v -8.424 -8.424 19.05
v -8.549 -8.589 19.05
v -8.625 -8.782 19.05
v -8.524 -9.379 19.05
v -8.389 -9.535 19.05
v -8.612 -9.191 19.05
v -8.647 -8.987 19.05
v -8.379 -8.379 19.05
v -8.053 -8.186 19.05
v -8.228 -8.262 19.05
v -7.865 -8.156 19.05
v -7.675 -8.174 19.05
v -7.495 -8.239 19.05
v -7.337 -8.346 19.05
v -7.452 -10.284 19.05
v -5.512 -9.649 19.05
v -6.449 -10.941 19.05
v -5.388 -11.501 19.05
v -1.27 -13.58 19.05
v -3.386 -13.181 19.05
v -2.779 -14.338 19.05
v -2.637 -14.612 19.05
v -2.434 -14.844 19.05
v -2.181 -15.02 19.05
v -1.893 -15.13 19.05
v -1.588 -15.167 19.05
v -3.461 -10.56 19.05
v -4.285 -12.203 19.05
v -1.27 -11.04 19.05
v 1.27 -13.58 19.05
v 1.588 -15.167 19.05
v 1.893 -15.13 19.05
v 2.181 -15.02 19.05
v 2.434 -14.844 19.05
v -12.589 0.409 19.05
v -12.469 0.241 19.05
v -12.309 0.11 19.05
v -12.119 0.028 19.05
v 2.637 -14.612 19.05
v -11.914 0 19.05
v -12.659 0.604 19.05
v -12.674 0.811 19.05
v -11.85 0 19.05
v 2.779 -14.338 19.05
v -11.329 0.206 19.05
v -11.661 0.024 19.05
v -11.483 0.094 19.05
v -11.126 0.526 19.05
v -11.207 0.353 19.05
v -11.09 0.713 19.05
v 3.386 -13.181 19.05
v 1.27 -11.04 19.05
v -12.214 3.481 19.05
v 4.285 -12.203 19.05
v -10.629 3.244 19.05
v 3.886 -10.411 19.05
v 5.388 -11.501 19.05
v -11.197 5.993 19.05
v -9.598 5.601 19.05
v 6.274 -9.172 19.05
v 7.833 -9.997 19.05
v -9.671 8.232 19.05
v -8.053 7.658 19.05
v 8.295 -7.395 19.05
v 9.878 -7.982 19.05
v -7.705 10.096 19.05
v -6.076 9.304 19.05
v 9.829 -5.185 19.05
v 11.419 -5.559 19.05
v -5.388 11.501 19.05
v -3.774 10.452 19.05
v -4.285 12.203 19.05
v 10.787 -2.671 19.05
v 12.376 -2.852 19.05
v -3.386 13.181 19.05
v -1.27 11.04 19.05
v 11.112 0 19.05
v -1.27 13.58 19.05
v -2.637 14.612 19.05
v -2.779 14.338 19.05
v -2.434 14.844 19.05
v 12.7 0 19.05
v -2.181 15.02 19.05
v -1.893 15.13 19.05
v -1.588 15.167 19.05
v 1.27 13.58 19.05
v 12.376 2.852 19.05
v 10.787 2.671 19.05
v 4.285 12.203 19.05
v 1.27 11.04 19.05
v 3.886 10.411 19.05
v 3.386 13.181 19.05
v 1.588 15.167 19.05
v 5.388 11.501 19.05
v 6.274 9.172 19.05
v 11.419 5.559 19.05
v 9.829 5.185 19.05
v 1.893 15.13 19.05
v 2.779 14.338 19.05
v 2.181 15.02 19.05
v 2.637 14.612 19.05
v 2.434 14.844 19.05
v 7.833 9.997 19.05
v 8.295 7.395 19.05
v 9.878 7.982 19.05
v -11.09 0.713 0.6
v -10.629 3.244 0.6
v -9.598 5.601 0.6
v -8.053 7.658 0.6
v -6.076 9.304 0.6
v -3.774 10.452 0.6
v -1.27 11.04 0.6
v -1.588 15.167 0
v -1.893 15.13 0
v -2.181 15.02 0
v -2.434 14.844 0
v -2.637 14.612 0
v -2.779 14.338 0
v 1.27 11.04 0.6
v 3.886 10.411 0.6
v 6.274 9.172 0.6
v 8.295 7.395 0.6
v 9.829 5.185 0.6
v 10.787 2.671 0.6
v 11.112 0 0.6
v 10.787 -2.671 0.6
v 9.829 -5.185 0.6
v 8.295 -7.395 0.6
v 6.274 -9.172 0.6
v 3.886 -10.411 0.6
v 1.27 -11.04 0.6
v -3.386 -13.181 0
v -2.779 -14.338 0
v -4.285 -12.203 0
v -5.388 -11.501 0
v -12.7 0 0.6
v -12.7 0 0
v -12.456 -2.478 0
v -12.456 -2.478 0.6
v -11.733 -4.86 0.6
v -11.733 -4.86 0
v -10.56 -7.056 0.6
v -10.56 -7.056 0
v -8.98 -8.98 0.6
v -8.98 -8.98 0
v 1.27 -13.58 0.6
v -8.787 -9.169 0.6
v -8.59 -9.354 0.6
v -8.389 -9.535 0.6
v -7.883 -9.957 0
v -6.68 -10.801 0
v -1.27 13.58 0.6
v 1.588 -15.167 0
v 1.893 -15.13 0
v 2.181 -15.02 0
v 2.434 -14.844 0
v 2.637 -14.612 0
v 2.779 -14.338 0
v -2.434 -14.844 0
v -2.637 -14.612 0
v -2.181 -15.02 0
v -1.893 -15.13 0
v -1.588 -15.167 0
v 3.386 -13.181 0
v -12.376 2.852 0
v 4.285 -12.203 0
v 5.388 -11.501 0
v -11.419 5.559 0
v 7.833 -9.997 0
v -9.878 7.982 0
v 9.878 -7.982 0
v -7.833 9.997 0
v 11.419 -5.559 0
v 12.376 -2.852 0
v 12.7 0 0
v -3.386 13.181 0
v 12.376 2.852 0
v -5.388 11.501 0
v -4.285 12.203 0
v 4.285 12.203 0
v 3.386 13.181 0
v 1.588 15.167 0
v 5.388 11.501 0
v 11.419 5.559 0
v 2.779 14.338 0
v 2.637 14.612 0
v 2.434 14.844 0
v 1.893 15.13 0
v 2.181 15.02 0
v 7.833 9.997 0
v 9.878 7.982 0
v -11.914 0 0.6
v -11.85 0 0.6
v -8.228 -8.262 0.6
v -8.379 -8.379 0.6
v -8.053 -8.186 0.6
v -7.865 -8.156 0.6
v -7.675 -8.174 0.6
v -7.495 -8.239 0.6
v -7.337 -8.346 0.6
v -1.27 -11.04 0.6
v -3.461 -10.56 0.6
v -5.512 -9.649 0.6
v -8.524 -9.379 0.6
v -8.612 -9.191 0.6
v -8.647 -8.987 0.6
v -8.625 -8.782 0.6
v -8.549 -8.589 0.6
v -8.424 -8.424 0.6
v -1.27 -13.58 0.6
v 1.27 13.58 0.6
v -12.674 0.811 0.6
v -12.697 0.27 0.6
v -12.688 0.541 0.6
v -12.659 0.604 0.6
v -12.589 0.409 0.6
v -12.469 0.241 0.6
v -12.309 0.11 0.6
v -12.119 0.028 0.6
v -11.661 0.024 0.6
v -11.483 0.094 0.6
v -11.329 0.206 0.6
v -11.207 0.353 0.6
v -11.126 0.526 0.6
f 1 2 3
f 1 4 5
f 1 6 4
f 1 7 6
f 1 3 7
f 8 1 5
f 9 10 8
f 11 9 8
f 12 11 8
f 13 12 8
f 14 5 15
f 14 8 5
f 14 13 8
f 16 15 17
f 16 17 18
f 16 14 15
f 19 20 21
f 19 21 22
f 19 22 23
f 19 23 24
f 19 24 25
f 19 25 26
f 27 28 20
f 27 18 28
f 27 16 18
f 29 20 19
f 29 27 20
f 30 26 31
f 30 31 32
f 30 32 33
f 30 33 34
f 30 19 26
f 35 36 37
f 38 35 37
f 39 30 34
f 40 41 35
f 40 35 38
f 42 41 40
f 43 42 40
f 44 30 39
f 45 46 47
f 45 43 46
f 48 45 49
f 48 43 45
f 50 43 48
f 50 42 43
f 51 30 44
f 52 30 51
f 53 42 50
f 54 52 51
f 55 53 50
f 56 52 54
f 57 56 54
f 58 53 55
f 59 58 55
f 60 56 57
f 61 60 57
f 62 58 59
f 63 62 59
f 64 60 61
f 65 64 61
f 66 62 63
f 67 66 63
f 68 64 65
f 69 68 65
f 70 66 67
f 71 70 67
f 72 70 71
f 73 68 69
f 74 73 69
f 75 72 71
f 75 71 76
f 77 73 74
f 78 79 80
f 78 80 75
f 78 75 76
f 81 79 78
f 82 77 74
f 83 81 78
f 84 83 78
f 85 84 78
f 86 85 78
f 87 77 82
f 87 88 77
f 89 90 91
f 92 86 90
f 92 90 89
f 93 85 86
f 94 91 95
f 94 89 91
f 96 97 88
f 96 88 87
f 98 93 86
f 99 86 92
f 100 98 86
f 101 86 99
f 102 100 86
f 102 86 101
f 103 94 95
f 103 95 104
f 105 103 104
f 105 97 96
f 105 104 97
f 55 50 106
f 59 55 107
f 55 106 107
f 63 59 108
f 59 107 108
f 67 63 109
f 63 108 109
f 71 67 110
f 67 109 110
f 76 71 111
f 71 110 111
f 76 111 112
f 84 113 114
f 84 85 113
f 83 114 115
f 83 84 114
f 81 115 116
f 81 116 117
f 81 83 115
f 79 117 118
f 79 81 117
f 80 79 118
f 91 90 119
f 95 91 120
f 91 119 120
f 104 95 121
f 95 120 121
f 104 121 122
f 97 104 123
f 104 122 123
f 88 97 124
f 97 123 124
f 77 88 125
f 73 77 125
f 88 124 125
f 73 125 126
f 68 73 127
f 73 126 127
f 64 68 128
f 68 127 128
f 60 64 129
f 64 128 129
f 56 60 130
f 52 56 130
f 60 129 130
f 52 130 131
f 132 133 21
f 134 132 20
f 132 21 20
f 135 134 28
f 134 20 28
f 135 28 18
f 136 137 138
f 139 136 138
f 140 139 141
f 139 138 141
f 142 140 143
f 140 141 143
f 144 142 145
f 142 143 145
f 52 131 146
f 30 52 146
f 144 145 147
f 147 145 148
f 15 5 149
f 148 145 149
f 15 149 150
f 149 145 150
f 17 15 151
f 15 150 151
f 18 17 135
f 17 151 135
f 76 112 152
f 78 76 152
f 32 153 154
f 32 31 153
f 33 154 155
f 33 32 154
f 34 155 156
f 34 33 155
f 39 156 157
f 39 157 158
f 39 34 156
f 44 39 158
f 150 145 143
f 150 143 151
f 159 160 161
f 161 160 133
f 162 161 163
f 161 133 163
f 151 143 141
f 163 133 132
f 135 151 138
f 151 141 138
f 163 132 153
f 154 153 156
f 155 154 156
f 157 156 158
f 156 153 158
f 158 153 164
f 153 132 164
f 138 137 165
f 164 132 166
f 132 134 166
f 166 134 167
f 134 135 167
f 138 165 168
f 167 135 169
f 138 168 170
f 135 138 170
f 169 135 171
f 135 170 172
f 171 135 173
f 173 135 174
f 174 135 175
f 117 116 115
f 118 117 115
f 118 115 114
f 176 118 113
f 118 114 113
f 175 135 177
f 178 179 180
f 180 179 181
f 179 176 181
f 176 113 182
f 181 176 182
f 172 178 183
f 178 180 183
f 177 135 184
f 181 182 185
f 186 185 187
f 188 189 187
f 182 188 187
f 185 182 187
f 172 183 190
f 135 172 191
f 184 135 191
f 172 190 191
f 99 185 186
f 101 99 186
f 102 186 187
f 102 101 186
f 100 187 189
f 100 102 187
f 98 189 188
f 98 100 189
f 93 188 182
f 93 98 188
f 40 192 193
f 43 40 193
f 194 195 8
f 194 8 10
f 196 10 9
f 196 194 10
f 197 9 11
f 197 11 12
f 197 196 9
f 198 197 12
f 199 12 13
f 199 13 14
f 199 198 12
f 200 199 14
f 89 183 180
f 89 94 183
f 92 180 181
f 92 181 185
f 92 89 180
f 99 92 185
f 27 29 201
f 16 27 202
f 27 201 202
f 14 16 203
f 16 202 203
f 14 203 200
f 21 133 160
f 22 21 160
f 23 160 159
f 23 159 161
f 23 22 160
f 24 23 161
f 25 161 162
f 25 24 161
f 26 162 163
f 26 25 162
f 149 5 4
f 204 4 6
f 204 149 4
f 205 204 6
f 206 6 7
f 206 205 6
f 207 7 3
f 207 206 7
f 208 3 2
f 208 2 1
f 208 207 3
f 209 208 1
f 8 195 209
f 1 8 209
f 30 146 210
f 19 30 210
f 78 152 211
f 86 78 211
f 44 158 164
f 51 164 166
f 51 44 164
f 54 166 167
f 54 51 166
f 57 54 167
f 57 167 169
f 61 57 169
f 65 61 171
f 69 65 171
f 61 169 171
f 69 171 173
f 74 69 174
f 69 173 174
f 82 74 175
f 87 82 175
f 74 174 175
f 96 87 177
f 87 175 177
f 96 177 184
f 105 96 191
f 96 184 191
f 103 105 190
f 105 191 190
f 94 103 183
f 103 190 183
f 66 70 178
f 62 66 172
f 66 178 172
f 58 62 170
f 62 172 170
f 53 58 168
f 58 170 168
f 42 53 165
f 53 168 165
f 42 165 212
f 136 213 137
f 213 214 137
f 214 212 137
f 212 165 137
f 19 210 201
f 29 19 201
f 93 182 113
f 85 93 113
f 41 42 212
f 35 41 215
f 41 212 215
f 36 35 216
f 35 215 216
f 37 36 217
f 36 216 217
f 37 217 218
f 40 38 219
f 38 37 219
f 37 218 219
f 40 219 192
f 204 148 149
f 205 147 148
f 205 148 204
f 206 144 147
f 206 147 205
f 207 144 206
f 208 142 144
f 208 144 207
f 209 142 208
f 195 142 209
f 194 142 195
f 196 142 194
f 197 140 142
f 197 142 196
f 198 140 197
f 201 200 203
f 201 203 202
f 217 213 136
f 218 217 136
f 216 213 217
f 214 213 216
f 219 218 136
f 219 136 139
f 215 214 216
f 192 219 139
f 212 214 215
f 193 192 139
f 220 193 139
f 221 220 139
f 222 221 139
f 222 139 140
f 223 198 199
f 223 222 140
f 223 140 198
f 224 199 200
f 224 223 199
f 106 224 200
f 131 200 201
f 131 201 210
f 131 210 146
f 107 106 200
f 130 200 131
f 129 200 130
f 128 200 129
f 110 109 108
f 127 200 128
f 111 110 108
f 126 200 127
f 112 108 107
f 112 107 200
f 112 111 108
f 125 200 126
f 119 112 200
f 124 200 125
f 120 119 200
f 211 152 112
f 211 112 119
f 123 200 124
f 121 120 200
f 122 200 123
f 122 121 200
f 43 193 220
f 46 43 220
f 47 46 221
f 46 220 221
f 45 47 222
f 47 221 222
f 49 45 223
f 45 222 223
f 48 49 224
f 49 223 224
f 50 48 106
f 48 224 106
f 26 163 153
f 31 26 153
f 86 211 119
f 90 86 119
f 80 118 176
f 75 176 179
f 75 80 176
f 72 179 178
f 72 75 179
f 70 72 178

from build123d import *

# Parameters (mm, degrees)
F1_DEPTH    = 0.5999988
F2_DEPTH    = 19.05
F3_R        = 1.27
F4_R        = 5.08
F5_T1_DEPTH = 20.4776308939
F5_T3_DEPTH = 20.2938151504


# Not quite as in the source:
# - a fillet or chamfer that OpenCascade refuses, or shapes differently, is made with other operations: its cross-section is extruded or revolved along the edge and cut away or added


with BuildPart() as f1:
    # F0 (on Top) → F1 (new body)
    with BuildSketch(Plane.XY):
        with BuildLine():
            Line((-1.27, 13.5796900432), (-1.27, 11.0396900432))
            ThreePointArc((-1.27, 11.0396900432), (-8.2945925533, 7.3950923338), (-11.1125, 0))
            ThreePointArc((-11.1125, 0), (-10.266611305, -4.2525696422), (-7.8577241059, -7.8577241059))
            ThreePointArc((-7.8577241059, -7.8577241059), (-4.8332249736, -10.0063775966), (-1.27, -11.0396900432))
            Line((-1.27, -11.0396900432), (-1.27, -13.5796900432))
            Line((-1.27, -13.5796900432), (0, -13.5796900432))
            Line((0, -13.5796900432), (1.27, -13.5796900432))
            Line((1.27, -13.5796900432), (1.27, -11.0396900432))
            ThreePointArc((1.27, -11.0396900432), (11.1125, 0), (1.27, 11.0396900432))
            Line((1.27, 11.0396900432), (1.27, 13.5796900432))
            Line((1.27, 13.5796900432), (0, 13.5796900432))
            Line((0, 13.5796900432), (-1.27, 13.5796900432))
        make_face()
        with BuildLine():
            ThreePointArc((-7.8577241059, -7.8577241059), (-10.266611305, -4.2525696422), (-11.1125, 0))
            Line((-11.1125, 0), (-12.7, 0))
            ThreePointArc((-12.7, 0), (-11.7332700629, -4.860079591), (-8.9802561211, -8.9802561211))
            Line((-8.9802561211, -8.9802561211), (-7.8577241059, -7.8577241059))
        make_face()
    extrude(amount=F1_DEPTH)

    # F0 (on Top) → F2 (join)
    with BuildSketch(Plane.XY):
        with BuildLine():
            ThreePointArc((-11.1125, 0), (-8.2945925533, 7.3950923338), (-1.27, 11.0396900432))
            Line((-1.27, 11.0396900432), (-1.27, 13.5796900432))
            Line((-1.27, 13.5796900432), (0, 13.5796900432))
            Line((0, 13.5796900432), (1.27, 13.5796900432))
            Line((1.27, 13.5796900432), (1.27, 11.0396900432))
            ThreePointArc((1.27, 11.0396900432), (11.1125, 0), (1.27, -11.0396900432))
            Line((1.27, -11.0396900432), (1.27, -13.5796900432))
            Line((1.27, -13.5796900432), (0, -13.5796900432))
            Line((0, -13.5796900432), (-1.27, -13.5796900432))
            Line((-1.27, -13.5796900432), (-1.27, -11.0396900432))
            ThreePointArc((-1.27, -11.0396900432), (-4.8332249736, -10.0063775966), (-7.8577241059, -7.8577241059))
            Line((-7.8577241059, -7.8577241059), (-8.9802561211, -8.9802561211))
            ThreePointArc((-8.9802561211, -8.9802561211), (-6.1573611633, -11.1075156315), (-2.8575, -12.3743562964))
            Line((-2.8575, -12.3743562964), (-2.8575, -15.1671900432))
            Line((-2.8575, -15.1671900432), (0, -15.1671900432))
            Line((0, -15.1671900432), (2.8575, -15.1671900432))
            Line((2.8575, -15.1671900432), (2.8575, -12.3743562964))
            ThreePointArc((2.8575, -12.3743562964), (12.7, 0), (2.8575, 12.3743562964))
            Line((2.8575, 12.3743562964), (2.8575, 15.1671900432))
            Line((2.8575, 15.1671900432), (0, 15.1671900432))
            Line((0, 15.1671900432), (-2.8575, 15.1671900432))
            Line((-2.8575, 15.1671900432), (-2.8575, 12.3743562964))
            ThreePointArc((-2.8575, 12.3743562964), (-9.93932216, 7.9056862447), (-12.7, 0))
            Line((-12.7, 0), (-11.1125, 0))
        make_face()
    extrude(amount=F2_DEPTH)

    # F3
    f3_edges = [f1.edges().sort_by_distance(p)[0] for p in [
        (2.8575, -15.16719, 9.525),
        (-2.8575, -15.16719, 9.525),
        (-2.8575, 15.16719, 9.525),
        (2.8575, 15.16719, 9.525),
    ]]
    fillet(f3_edges, radius=F3_R)

    # F4
    f4_edges = [f1.edges().sort_by_distance(p)[0] for p in [
        (2.8575, 12.374356, 9.525),
        (-2.8575, 12.374356, 9.525),
        (-2.8575, -12.374356, 9.525),
        (2.8575, -12.374356, 9.525),
    ]]
    fillet(f4_edges, radius=F4_R)

    # F5: fillet of radius 0.762 on 4 edges, made by hand

    # F5_s2 → F5_t1 (cut)
    with BuildSketch(Plane.XY.offset(0.5999988)):
        with BuildLine():
            ThreePointArc((-12.6741021595, 0.8106382979), (-12.4694016476, 0.2406643993), (-11.91365603, 0))
            Line((-11.91365603, 0), (-12.7, 0))
            ThreePointArc((-12.7, 0), (-12.6935238887, 0.4055259388), (-12.6741021595, 0.8106382979))
        make_face()
        with BuildLine():
            ThreePointArc((-8.3887357449, -9.53515142), (-8.6470230336, -8.9873738911), (-8.4242269675, -8.4242269675))
            Line((-8.4242269675, -8.4242269675), (-8.9802561211, -8.9802561211))
            ThreePointArc((-8.9802561211, -8.9802561211), (-8.6889266776, -9.2624269601), (-8.3887357449, -9.53515142))
        make_face()
    extrude(amount=F5_T1_DEPTH, mode=Mode.SUBTRACT)

    # F5_s4 → F5_t3 (cut)
    with BuildSketch(Plane.XY.offset(0.5999988)):
        with BuildLine():
            ThreePointArc((-11.8500255801, 0), (-11.3287850299, 0.2061652325), (-11.0895961312, 0.7131016043))
            ThreePointArc((-11.0895961312, 0.7131016043), (-11.1067725568, 0.3567346651), (-11.1125, 0))
            Line((-11.1125, 0), (-11.8500255801, 0))
        make_face()
        with BuildLine():
            ThreePointArc((-8.379233445, -8.379233445), (-7.8648798833, -8.1564415512), (-7.3372896449, -8.345767605))
            ThreePointArc((-7.3372896449, -8.345767605), (-7.6014246912, -8.1059236928), (-7.8577241059, -7.8577241059))
            Line((-7.8577241059, -7.8577241059), (-8.379233445, -8.379233445))
        make_face()
    extrude(amount=F5_T3_DEPTH, mode=Mode.SUBTRACT)


solid = f1.part
